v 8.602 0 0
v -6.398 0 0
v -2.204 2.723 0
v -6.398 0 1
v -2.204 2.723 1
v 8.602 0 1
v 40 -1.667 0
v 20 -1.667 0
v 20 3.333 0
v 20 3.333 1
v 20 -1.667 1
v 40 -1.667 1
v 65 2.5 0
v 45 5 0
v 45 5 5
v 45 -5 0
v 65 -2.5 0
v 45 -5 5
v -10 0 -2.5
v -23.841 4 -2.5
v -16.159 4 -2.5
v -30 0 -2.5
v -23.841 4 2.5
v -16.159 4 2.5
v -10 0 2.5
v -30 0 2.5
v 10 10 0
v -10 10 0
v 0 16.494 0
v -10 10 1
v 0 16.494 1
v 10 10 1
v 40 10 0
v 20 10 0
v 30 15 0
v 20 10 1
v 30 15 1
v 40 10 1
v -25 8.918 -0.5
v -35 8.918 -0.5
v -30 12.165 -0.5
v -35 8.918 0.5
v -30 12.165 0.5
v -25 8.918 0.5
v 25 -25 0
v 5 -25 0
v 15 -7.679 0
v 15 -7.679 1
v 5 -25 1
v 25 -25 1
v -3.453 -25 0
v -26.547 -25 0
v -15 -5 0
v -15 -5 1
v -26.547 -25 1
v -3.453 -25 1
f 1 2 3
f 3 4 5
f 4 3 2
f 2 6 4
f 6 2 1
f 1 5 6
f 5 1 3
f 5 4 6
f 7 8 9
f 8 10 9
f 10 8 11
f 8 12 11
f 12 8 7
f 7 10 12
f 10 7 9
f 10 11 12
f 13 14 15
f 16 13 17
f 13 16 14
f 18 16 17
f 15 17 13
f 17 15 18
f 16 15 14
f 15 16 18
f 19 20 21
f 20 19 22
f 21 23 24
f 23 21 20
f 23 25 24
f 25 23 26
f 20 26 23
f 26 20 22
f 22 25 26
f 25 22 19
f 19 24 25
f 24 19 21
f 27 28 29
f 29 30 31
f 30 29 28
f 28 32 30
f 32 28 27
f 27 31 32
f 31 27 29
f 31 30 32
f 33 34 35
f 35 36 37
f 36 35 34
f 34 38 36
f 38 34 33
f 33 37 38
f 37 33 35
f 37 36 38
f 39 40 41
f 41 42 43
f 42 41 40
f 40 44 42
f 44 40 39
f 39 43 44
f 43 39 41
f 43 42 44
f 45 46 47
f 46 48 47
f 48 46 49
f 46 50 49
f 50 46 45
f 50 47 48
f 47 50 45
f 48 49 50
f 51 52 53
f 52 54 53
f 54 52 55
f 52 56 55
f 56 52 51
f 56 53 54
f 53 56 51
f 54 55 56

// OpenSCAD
/*
Triangles.scad
 Author: Tim Koopman
 https://github.com/tkoopman/Delta-Diamond/blob/master/OpenSCAD/Triangles.scad

         angleCA
           /|\
        a / H \ c
         /  |  \
 angleAB ------- angleBC
            b

Standard Parameters
	center: true/false
		If true same as centerXYZ = [true, true, true]

	centerXYZ: Vector of 3 true/false values [CenterX, CenterY, CenterZ]
		center must be left undef

	height: The 3D height of the Triangle. Ignored if heights defined

	heights: Vector of 3 height values heights @ [angleAB, angleBC, angleCA]
		If CenterZ is true each height will be centered individually, this means
		the shape will be different depending on CenterZ. Most times you will want
		CenterZ to be true to get the shape most people want.
*/

/* 
Triangle
	a: Length of side a
	b: Length of side b
	angle: angle at point angleAB
*/
module Triangle(
			a, b, angle, height=1, heights=undef,
			center=undef, centerXYZ=[false,false,false])
{
	// Calculate Heights at each point
	heightAB = ((heights==undef) ? height : heights[0])/2;
	heightBC = ((heights==undef) ? height : heights[1])/2;
	heightCA = ((heights==undef) ? height : heights[2])/2;
	centerZ = (center || (center==undef && centerXYZ[2]))?0:max(heightAB,heightBC,heightCA);

	// Calculate Offsets for centering
	offsetX = (center || (center==undef && centerXYZ[0]))?((cos(angle)*a)+b)/3:0;
	offsetY = (center || (center==undef && centerXYZ[1]))?(sin(angle)*a)/3:0;
	
	pointAB1 = [-offsetX,-offsetY, centerZ-heightAB];
	pointAB2 = [-offsetX,-offsetY, centerZ+heightAB];
	pointBC1 = [b-offsetX,-offsetY, centerZ-heightBC];
	pointBC2 = [b-offsetX,-offsetY, centerZ+heightBC];
	pointCA1 = [(cos(angle)*a)-offsetX,(sin(angle)*a)-offsetY, centerZ-heightCA];
	pointCA2 = [(cos(angle)*a)-offsetX,(sin(angle)*a)-offsetY, centerZ+heightCA];

	polyhedron(
		points=[	pointAB1, pointBC1, pointCA1,
					pointAB2, pointBC2, pointCA2 ],
		faces=[	
			[0, 1, 2],
			[3, 5, 4],
			[0, 3, 1],
			[1, 3, 4],
			[1, 4, 2],
			[2, 4, 5],
			[2, 5, 0],
			[0, 5, 3] ] );
}

/*
Isosceles Triangle
	Exactly 2 of the following paramaters must be defined.
	If all 3 defined H will be ignored.
	b: length of side b
	angle: angle at points angleAB & angleBC.
*/
module Isosceles_Triangle(
			b, angle, H=undef, height=1, heights=undef,
			center=undef, centerXYZ=[true, false, false])
{
	valid = 	(angle!=undef)?((angle < 90) && (b!=undef||H!=undef)) : (b!=undef&&H!=undef);
	ANGLE = (angle!=undef) ? angle : atan(H / (b/2));
	a = (b==undef)?(H/sin((180-(angle*2))/2)) : 
		 (b / cos(ANGLE))/2;
	B = (b==undef)? (cos(angle)*a)*2:b;
	if (valid)
	{
		Triangle(a=a, b=B, angle=ANGLE, height=height, heights=heights,
					center=center, centerXYZ=centerXYZ);
	} else {
		echo("Invalid Isosceles_Triangle. Must specify any 2 of b, angle and H, and if angle used angle must be less than 90");
	}
}

/*
Right Angled Triangle
	Create a Right Angled Triangle where the hypotenuse will be calculated.

       |\
      a| \
       |  \
       ----
         b
	a: length of side a
	b: length of side b
*/
module Right_Angled_Triangle(
			a, b, height=1, heights=undef,
			center=undef, centerXYZ=[false, false, false])
{
	Triangle(a=a, b=b, angle=90, height=height, heights=heights,
				center=center, centerXYZ=centerXYZ);
}

/*
Wedge
	Is same as Right Angled Triangle with 2 different heights, and rotated.
	Good for creating support structures.
*/
module Wedge(a, b, w1, w2)
{
	rotate([90,0,0])
		Right_Angled_Triangle(a, b, heights=[w1, w2, w1], centerXYZ=[false, false, true]);
}

/*
Equilateral Triangle
	Create a Equilateral Triangle.

	l: Length of all sides (a, b & c)
	H: Triangle size will be based on the this 2D height
		When using H, l is ignored.
*/
module Equilateral_Triangle(
			l=10, H=undef, height=1, heights=undef,
			center=undef, centerXYZ=[true,false,false])
{
	L = (H==undef)?l:H/sin(60);
	Triangle(a=L,b=L,angle=60,height=height, heights=heights,
				center=center, centerXYZ=centerXYZ);
}

/*
Trapezoid
	Create a Basic Trapezoid (Based on Isosceles_Triangle)

            d
          /----\
         /  |   \
     a  /   H    \ c
       /    |     \
 angle ------------ angle
            b

	b: Length of side b
	angle: Angle at points angleAB & angleBC
	H: The 2D height at which the triangle should be cut to create the trapezoid
	heights: If vector of size 3 (Standard for triangles) both cd & da will be the same height, if vector have 4 values [ab,bc,cd,da] than each point can have different heights.
*/
module Trapezoid(
			b, angle=60, H, height=1, heights=undef,
			center=undef, centerXYZ=[true,false,false])
{
	validAngle = (angle < 90);
	adX = H / tan(angle);

	// Calculate Heights at each point
	heightAB = ((heights==undef) ? height : heights[0])/2;
	heightBC = ((heights==undef) ? height : heights[1])/2;
	heightCD = ((heights==undef) ? height : heights[2])/2;
	heightDA = ((heights==undef) ? height : ((len(heights) > 3)?heights[3]:heights[2]))/2;

	// Centers
	centerX = (center || (center==undef && centerXYZ[0]))?0:b/2;
	centerY = (center || (center==undef && centerXYZ[1]))?0:H/2;
	centerZ = (center || (center==undef && centerXYZ[2]))?0:max(heightAB,heightBC,heightCD,heightDA);

	// Points
	y = H/2;
	bx = b/2;
	dx = (b-(adX*2))/2;

	pointAB1 = [centerX-bx, centerY-y, centerZ-heightAB];
	pointAB2 = [centerX-bx, centerY-y, centerZ+heightAB];
	pointBC1 = [centerX+bx, centerY-y, centerZ-heightBC];
	pointBC2 = [centerX+bx, centerY-y, centerZ+heightBC];
	pointCD1 = [centerX+dx, centerY+y, centerZ-heightCD];
	pointCD2 = [centerX+dx, centerY+y, centerZ+heightCD];
	pointDA1 = [centerX-dx, centerY+y, centerZ-heightDA];
	pointDA2 = [centerX-dx, centerY+y, centerZ+heightDA];

	validH = (adX < b/2);

	if (validAngle && validH)
	{
		polyhedron(
			points=[	pointAB1, pointBC1, pointCD1, pointDA1,
						pointAB2, pointBC2, pointCD2, pointDA2 ],
			faces=[	
				[0, 1, 2],
				[0, 2, 3],
				[4, 6, 5],
				[4, 7, 6],
				[0, 4, 1],
				[1, 4, 5],
				[1, 5, 2],
				[2, 5, 6],
				[2, 6, 3],
				[3, 6, 7],
				[3, 7, 0],
				[0, 7, 4]	] );
	} else {
		if (!validAngle) echo("Trapezoid invalid, angle must be less than 90");
		else echo("Trapezoid invalid, H is larger than triangle");
	}
}


// Examples
Triangle(a=5, b=15, angle=33, centerXYZ=[true,false,false]);
translate([20,0,0]) Right_Angled_Triangle(a=5, b=20, centerXYZ=[false,true,false]);
translate([45,0,0]) Wedge(a=5, b=20, w1=10, w2=5);
translate([-20,0,0]) Trapezoid(b=20, angle=33, H=4, height=5, centerXYZ=[true,false,true]);

translate([0,10,0]) Isosceles_Triangle(b=20, angle=33);
translate([30,10,0]) Isosceles_Triangle(b=20, H=5);
translate([-30,10,0]) Isosceles_Triangle(angle=33, H=5, center=true);

translate([15,-25,0]) Equilateral_Triangle(l=20);
translate([-15,-25,0]) Equilateral_Triangle(H=20);
